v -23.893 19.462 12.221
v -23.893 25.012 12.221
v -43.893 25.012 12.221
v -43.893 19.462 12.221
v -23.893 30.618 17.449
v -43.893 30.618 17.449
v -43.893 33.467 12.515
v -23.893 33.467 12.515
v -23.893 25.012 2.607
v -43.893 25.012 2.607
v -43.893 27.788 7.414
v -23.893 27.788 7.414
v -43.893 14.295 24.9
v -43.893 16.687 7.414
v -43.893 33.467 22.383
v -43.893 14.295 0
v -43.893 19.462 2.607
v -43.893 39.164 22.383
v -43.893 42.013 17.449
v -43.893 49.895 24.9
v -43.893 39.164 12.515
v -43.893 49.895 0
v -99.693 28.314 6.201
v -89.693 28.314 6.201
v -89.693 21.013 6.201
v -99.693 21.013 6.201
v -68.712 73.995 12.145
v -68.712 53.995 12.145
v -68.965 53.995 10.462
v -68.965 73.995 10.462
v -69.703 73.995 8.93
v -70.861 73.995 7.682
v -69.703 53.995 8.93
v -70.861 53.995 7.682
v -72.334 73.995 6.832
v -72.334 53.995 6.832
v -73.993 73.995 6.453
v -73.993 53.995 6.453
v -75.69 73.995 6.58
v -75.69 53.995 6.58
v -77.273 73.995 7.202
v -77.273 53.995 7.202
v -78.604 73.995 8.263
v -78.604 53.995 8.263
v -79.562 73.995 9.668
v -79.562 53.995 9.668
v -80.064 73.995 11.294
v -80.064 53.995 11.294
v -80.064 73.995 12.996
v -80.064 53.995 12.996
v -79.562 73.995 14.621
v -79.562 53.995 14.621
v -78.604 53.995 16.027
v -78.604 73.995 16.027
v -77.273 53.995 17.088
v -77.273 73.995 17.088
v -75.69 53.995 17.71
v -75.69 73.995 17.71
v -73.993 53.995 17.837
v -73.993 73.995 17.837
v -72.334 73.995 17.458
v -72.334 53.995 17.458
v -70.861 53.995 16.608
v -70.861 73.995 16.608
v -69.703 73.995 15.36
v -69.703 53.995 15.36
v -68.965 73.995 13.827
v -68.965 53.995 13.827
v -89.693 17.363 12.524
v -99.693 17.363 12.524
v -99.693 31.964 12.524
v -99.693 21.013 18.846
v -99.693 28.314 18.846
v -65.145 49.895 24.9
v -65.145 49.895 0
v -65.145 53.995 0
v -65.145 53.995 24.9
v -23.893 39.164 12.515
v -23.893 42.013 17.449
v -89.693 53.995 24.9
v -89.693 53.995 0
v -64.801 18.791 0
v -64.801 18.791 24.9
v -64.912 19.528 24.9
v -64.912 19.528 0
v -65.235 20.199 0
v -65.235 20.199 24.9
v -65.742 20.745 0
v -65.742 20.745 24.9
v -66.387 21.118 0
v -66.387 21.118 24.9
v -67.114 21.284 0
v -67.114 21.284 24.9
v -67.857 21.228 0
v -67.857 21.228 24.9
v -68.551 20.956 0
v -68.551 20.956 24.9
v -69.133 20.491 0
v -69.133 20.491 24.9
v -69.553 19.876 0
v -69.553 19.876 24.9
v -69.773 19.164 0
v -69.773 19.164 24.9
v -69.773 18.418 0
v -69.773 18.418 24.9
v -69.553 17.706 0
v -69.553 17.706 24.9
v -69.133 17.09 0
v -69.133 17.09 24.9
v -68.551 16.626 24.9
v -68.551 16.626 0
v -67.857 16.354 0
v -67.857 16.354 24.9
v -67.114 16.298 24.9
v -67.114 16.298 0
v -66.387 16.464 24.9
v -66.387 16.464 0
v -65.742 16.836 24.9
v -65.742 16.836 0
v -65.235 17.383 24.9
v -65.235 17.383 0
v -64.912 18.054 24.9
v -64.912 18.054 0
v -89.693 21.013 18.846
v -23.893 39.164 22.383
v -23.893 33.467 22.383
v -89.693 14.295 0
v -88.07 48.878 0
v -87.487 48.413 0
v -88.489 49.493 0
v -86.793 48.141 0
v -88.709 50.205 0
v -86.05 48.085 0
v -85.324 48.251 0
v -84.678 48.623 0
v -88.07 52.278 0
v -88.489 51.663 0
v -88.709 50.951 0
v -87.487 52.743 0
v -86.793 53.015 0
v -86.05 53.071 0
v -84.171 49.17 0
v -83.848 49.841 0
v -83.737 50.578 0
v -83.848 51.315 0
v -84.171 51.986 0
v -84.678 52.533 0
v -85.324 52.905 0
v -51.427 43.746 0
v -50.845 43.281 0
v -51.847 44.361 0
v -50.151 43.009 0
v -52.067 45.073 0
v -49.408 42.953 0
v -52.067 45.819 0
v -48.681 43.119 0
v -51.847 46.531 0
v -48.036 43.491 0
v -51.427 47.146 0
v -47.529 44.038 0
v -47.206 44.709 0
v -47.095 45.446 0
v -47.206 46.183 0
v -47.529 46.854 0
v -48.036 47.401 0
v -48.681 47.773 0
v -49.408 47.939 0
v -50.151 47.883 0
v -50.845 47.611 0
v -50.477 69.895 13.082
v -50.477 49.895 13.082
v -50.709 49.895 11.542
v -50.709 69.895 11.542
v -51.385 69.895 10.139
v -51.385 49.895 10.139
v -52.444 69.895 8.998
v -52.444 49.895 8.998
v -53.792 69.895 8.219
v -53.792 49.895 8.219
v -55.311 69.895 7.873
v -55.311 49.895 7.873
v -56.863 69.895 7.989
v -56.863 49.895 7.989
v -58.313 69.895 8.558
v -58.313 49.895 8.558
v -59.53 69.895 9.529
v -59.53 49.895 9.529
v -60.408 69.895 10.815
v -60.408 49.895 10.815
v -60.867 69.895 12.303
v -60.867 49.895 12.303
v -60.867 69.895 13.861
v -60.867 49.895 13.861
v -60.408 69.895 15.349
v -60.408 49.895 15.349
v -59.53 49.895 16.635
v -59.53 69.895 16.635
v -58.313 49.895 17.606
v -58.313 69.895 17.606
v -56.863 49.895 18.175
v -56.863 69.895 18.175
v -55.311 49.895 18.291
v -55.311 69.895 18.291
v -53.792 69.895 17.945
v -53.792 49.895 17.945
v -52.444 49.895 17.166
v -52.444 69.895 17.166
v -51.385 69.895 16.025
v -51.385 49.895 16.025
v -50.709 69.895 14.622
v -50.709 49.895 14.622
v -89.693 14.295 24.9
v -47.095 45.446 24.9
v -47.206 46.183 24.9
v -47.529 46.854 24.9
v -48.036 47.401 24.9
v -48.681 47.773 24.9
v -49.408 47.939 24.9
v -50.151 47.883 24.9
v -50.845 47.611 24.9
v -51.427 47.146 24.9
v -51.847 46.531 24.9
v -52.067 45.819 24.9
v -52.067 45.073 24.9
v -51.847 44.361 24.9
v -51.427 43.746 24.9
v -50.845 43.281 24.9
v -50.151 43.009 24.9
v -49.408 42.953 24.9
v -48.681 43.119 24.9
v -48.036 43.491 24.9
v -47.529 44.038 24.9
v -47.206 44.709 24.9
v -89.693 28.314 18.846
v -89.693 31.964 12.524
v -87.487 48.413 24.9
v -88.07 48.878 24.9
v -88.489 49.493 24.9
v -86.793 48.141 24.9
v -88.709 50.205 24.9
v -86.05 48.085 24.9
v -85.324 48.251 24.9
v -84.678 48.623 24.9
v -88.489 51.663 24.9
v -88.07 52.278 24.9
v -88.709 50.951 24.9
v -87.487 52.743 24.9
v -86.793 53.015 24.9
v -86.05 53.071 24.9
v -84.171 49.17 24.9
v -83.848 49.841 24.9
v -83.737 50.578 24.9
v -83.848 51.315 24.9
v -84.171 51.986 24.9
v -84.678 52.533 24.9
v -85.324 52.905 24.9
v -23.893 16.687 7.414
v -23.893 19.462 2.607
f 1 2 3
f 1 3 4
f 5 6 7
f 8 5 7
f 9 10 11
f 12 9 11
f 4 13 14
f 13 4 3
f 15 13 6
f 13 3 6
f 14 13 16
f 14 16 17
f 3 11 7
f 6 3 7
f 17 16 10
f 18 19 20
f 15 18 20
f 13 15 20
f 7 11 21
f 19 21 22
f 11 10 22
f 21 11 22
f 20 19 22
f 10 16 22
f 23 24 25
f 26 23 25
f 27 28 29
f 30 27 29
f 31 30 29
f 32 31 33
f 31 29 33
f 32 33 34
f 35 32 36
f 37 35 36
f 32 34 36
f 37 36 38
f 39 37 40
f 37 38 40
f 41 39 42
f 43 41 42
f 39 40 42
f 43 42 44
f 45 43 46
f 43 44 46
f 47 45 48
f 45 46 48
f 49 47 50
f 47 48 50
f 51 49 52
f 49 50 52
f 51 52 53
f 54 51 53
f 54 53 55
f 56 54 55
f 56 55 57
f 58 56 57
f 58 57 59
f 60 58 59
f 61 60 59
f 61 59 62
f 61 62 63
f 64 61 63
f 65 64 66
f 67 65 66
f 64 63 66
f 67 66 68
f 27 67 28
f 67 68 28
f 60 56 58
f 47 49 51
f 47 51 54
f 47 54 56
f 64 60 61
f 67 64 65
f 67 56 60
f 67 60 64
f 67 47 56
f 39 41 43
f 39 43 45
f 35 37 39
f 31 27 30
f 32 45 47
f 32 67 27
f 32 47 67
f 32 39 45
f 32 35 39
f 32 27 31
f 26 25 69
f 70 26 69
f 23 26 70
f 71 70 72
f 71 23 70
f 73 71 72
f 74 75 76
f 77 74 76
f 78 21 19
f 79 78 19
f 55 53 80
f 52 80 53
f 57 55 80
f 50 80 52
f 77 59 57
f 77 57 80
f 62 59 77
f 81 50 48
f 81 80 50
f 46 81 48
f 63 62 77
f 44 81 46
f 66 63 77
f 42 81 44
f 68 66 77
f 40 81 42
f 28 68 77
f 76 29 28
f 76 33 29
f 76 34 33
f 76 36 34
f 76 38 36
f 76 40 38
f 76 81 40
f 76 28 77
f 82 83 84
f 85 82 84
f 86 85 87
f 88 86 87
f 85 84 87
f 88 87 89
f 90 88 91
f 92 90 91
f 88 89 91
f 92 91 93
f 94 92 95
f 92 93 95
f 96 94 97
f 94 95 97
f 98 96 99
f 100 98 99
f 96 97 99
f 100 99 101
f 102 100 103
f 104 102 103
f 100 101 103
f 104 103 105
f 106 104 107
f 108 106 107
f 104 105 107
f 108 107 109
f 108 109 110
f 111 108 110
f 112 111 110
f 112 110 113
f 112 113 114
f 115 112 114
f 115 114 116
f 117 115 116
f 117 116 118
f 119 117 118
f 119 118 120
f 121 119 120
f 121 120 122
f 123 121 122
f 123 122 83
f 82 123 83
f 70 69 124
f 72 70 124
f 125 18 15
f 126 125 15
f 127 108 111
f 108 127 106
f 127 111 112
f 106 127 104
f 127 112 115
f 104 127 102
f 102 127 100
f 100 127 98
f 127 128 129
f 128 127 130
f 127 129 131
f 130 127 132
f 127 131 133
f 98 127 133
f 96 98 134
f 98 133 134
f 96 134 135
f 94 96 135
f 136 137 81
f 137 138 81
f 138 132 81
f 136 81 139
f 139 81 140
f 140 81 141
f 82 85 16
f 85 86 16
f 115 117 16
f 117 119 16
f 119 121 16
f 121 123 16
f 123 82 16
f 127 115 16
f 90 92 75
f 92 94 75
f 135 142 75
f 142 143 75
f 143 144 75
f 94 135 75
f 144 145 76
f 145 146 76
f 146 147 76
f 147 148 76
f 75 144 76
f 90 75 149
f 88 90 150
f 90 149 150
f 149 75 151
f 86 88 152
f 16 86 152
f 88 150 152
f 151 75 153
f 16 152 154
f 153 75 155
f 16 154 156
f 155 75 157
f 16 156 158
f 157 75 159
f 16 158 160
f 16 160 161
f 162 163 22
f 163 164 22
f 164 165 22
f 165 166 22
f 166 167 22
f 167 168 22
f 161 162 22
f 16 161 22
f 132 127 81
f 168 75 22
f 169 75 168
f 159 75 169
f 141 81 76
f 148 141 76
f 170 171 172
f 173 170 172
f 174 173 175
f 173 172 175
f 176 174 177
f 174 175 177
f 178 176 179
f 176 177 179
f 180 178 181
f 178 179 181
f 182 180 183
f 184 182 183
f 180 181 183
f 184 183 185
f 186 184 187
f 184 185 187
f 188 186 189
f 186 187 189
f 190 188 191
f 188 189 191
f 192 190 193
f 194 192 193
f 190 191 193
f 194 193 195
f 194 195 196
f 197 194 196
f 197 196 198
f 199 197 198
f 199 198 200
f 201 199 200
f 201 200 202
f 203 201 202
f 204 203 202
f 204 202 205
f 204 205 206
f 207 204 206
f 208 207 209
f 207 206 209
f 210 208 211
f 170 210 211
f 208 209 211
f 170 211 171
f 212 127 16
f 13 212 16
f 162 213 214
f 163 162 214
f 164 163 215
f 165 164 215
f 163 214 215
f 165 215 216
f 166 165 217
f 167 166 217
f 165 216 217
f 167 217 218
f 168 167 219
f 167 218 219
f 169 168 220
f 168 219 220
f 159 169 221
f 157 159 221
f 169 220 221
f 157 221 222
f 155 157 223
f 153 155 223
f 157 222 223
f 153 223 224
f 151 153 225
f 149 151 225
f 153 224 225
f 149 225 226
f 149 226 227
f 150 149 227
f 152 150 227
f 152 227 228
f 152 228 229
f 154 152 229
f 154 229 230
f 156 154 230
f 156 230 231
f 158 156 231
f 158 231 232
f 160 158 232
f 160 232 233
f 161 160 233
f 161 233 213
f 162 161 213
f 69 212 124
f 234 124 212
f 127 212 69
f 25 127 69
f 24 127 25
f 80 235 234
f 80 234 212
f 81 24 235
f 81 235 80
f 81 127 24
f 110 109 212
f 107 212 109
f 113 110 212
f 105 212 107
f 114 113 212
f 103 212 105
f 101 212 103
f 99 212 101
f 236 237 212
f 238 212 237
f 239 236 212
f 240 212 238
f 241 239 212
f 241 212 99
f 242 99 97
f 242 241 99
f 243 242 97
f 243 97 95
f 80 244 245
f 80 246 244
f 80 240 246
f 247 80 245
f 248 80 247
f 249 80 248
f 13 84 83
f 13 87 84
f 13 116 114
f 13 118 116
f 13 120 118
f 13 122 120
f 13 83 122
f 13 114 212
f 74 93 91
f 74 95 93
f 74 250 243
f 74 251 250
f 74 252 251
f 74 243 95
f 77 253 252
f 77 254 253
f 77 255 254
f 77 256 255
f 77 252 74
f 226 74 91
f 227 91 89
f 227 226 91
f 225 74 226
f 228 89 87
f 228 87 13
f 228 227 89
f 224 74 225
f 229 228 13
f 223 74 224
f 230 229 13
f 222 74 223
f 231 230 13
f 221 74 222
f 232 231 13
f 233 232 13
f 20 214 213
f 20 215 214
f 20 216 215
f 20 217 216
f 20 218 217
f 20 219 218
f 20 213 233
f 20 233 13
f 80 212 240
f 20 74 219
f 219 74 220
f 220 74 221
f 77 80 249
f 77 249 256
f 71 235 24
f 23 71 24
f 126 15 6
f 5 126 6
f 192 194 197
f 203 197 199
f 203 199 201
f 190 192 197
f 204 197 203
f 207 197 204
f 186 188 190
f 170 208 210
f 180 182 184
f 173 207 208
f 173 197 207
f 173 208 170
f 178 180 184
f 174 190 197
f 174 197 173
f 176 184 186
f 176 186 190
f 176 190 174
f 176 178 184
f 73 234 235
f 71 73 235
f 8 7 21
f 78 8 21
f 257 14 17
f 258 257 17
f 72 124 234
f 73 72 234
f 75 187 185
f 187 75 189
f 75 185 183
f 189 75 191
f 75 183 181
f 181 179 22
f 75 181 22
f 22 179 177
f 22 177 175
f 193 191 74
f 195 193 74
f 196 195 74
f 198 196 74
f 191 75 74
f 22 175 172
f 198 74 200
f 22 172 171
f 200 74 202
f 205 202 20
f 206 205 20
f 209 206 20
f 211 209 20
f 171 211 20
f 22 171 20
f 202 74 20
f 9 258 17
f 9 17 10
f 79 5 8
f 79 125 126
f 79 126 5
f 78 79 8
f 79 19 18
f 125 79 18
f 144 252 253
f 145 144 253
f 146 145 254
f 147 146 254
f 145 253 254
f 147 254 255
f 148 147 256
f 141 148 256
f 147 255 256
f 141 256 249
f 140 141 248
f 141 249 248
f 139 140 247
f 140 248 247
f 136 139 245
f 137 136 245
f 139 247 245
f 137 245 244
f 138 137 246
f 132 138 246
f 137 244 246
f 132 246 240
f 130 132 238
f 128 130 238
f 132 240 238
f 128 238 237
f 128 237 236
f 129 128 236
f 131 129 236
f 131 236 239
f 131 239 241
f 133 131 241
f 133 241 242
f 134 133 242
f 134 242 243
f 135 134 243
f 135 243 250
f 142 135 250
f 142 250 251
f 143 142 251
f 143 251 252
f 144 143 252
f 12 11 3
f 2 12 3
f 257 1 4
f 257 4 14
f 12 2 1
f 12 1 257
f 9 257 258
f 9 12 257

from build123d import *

# Parameters (mm, degrees)
SKETCH1_W           = 45.8
SKETCH1_H           = 39.7
BOSS_EXTRUDE1_DEPTH = 24.9
SKETCH2_W           = 21.252664268
SKETCH2_H           = 4.1
CUT_EXTRUDE1_DEPTH  = 24.9
SKETCH3_R           = 5.707882507
BOSS_EXTRUDE2_DEPTH = 20
SKETCH4_R           = 5.223999668
BOSS_EXTRUDE3_DEPTH = 20
BOSS_EXTRUDE4_DEPTH = 10
BOSS_EXTRUDE5_DEPTH = 20
SKETCH7_R           = 2.5
CUT_EXTRUDE2_DEPTH  = 100


with BuildPart() as part:
    # Sketch1 → Boss-Extrude1 (new body)
    with BuildSketch(Plane.XY):
        with Locations((-66.792592593, 34.14526749)):
            Rectangle(SKETCH1_W, SKETCH1_H)
    extrude(amount=BOSS_EXTRUDE1_DEPTH)

    # Sketch2 → Cut-Extrude1 (cut)
    with BuildSketch(Plane.XY.offset(24.9)):
        with Locations((-54.518924727, 51.94526749)):
            Rectangle(SKETCH2_W, SKETCH2_H)
    extrude(amount=-CUT_EXTRUDE1_DEPTH, mode=Mode.SUBTRACT)

    # Sketch3 → Boss-Extrude2 (add)
    with BuildSketch(Plane(origin=(0, 53.99526749, 0), x_dir=(1, 0, 0), z_dir=(0, 1, 0))):
        with Locations((-74.419404391, -12.144927528)):
            Circle(SKETCH3_R)
    extrude(amount=BOSS_EXTRUDE2_DEPTH)

    # Sketch4 → Boss-Extrude3 (add)
    with BuildSketch(Plane(origin=(0, 49.89526749, 0), x_dir=(1, 0, 0), z_dir=(0, 1, 0))):
        with Locations((-55.701029149, -13.081935835)):
            Circle(SKETCH4_R)
    extrude(amount=BOSS_EXTRUDE3_DEPTH)

    # Sketch5 → Boss-Extrude4 (add)
    with BuildSketch(Plane.ZY.offset(89.692592593)):
        Polygon((18.845976306, 21.012997096), (18.845976306, 28.313544296), (12.523516969, 31.963817896), (6.201057632, 28.313544296), (6.201057632, 21.012997096), (12.523516969, 17.362723496), align=None)
    extrude(amount=BOSS_EXTRUDE4_DEPTH)

    # Sketch6 → Boss-Extrude5 (add)
    with BuildSketch(Plane(origin=(-43.892592593, 0, 0), x_dir=(0, 0, -1), z_dir=(1, 0, 0))):
        Polygon((-17.449153894, 30.618145188), (-12.514917778, 33.466927738), (-12.514917778, 39.164492838), (-17.449153894, 42.013275388), (-22.383390011, 39.164492838), (-22.383390011, 33.466927738), align=None)
        Polygon((-7.414087621, 16.686679556), (-2.60718663, 19.461945137), (-2.60718663, 25.012476299), (-7.414087621, 27.78774188), (-12.220988612, 25.012476299), (-12.220988612, 19.461945137), align=None)
    extrude(amount=BOSS_EXTRUDE5_DEPTH)

    # Sketch7 → Cut-Extrude2 (cut)
    with BuildSketch(Plane.XY.offset(24.9)):
        with Locations((-67.30075544, 18.790910281)):
            Circle(SKETCH7_R)
        with Locations((-86.236984796, 50.57800228)):
            Circle(SKETCH7_R)
        with Locations((-49.59462681, 45.445985012)):
            Circle(SKETCH7_R)
    extrude(amount=-CUT_EXTRUDE2_DEPTH, mode=Mode.SUBTRACT)


solid = part.part
